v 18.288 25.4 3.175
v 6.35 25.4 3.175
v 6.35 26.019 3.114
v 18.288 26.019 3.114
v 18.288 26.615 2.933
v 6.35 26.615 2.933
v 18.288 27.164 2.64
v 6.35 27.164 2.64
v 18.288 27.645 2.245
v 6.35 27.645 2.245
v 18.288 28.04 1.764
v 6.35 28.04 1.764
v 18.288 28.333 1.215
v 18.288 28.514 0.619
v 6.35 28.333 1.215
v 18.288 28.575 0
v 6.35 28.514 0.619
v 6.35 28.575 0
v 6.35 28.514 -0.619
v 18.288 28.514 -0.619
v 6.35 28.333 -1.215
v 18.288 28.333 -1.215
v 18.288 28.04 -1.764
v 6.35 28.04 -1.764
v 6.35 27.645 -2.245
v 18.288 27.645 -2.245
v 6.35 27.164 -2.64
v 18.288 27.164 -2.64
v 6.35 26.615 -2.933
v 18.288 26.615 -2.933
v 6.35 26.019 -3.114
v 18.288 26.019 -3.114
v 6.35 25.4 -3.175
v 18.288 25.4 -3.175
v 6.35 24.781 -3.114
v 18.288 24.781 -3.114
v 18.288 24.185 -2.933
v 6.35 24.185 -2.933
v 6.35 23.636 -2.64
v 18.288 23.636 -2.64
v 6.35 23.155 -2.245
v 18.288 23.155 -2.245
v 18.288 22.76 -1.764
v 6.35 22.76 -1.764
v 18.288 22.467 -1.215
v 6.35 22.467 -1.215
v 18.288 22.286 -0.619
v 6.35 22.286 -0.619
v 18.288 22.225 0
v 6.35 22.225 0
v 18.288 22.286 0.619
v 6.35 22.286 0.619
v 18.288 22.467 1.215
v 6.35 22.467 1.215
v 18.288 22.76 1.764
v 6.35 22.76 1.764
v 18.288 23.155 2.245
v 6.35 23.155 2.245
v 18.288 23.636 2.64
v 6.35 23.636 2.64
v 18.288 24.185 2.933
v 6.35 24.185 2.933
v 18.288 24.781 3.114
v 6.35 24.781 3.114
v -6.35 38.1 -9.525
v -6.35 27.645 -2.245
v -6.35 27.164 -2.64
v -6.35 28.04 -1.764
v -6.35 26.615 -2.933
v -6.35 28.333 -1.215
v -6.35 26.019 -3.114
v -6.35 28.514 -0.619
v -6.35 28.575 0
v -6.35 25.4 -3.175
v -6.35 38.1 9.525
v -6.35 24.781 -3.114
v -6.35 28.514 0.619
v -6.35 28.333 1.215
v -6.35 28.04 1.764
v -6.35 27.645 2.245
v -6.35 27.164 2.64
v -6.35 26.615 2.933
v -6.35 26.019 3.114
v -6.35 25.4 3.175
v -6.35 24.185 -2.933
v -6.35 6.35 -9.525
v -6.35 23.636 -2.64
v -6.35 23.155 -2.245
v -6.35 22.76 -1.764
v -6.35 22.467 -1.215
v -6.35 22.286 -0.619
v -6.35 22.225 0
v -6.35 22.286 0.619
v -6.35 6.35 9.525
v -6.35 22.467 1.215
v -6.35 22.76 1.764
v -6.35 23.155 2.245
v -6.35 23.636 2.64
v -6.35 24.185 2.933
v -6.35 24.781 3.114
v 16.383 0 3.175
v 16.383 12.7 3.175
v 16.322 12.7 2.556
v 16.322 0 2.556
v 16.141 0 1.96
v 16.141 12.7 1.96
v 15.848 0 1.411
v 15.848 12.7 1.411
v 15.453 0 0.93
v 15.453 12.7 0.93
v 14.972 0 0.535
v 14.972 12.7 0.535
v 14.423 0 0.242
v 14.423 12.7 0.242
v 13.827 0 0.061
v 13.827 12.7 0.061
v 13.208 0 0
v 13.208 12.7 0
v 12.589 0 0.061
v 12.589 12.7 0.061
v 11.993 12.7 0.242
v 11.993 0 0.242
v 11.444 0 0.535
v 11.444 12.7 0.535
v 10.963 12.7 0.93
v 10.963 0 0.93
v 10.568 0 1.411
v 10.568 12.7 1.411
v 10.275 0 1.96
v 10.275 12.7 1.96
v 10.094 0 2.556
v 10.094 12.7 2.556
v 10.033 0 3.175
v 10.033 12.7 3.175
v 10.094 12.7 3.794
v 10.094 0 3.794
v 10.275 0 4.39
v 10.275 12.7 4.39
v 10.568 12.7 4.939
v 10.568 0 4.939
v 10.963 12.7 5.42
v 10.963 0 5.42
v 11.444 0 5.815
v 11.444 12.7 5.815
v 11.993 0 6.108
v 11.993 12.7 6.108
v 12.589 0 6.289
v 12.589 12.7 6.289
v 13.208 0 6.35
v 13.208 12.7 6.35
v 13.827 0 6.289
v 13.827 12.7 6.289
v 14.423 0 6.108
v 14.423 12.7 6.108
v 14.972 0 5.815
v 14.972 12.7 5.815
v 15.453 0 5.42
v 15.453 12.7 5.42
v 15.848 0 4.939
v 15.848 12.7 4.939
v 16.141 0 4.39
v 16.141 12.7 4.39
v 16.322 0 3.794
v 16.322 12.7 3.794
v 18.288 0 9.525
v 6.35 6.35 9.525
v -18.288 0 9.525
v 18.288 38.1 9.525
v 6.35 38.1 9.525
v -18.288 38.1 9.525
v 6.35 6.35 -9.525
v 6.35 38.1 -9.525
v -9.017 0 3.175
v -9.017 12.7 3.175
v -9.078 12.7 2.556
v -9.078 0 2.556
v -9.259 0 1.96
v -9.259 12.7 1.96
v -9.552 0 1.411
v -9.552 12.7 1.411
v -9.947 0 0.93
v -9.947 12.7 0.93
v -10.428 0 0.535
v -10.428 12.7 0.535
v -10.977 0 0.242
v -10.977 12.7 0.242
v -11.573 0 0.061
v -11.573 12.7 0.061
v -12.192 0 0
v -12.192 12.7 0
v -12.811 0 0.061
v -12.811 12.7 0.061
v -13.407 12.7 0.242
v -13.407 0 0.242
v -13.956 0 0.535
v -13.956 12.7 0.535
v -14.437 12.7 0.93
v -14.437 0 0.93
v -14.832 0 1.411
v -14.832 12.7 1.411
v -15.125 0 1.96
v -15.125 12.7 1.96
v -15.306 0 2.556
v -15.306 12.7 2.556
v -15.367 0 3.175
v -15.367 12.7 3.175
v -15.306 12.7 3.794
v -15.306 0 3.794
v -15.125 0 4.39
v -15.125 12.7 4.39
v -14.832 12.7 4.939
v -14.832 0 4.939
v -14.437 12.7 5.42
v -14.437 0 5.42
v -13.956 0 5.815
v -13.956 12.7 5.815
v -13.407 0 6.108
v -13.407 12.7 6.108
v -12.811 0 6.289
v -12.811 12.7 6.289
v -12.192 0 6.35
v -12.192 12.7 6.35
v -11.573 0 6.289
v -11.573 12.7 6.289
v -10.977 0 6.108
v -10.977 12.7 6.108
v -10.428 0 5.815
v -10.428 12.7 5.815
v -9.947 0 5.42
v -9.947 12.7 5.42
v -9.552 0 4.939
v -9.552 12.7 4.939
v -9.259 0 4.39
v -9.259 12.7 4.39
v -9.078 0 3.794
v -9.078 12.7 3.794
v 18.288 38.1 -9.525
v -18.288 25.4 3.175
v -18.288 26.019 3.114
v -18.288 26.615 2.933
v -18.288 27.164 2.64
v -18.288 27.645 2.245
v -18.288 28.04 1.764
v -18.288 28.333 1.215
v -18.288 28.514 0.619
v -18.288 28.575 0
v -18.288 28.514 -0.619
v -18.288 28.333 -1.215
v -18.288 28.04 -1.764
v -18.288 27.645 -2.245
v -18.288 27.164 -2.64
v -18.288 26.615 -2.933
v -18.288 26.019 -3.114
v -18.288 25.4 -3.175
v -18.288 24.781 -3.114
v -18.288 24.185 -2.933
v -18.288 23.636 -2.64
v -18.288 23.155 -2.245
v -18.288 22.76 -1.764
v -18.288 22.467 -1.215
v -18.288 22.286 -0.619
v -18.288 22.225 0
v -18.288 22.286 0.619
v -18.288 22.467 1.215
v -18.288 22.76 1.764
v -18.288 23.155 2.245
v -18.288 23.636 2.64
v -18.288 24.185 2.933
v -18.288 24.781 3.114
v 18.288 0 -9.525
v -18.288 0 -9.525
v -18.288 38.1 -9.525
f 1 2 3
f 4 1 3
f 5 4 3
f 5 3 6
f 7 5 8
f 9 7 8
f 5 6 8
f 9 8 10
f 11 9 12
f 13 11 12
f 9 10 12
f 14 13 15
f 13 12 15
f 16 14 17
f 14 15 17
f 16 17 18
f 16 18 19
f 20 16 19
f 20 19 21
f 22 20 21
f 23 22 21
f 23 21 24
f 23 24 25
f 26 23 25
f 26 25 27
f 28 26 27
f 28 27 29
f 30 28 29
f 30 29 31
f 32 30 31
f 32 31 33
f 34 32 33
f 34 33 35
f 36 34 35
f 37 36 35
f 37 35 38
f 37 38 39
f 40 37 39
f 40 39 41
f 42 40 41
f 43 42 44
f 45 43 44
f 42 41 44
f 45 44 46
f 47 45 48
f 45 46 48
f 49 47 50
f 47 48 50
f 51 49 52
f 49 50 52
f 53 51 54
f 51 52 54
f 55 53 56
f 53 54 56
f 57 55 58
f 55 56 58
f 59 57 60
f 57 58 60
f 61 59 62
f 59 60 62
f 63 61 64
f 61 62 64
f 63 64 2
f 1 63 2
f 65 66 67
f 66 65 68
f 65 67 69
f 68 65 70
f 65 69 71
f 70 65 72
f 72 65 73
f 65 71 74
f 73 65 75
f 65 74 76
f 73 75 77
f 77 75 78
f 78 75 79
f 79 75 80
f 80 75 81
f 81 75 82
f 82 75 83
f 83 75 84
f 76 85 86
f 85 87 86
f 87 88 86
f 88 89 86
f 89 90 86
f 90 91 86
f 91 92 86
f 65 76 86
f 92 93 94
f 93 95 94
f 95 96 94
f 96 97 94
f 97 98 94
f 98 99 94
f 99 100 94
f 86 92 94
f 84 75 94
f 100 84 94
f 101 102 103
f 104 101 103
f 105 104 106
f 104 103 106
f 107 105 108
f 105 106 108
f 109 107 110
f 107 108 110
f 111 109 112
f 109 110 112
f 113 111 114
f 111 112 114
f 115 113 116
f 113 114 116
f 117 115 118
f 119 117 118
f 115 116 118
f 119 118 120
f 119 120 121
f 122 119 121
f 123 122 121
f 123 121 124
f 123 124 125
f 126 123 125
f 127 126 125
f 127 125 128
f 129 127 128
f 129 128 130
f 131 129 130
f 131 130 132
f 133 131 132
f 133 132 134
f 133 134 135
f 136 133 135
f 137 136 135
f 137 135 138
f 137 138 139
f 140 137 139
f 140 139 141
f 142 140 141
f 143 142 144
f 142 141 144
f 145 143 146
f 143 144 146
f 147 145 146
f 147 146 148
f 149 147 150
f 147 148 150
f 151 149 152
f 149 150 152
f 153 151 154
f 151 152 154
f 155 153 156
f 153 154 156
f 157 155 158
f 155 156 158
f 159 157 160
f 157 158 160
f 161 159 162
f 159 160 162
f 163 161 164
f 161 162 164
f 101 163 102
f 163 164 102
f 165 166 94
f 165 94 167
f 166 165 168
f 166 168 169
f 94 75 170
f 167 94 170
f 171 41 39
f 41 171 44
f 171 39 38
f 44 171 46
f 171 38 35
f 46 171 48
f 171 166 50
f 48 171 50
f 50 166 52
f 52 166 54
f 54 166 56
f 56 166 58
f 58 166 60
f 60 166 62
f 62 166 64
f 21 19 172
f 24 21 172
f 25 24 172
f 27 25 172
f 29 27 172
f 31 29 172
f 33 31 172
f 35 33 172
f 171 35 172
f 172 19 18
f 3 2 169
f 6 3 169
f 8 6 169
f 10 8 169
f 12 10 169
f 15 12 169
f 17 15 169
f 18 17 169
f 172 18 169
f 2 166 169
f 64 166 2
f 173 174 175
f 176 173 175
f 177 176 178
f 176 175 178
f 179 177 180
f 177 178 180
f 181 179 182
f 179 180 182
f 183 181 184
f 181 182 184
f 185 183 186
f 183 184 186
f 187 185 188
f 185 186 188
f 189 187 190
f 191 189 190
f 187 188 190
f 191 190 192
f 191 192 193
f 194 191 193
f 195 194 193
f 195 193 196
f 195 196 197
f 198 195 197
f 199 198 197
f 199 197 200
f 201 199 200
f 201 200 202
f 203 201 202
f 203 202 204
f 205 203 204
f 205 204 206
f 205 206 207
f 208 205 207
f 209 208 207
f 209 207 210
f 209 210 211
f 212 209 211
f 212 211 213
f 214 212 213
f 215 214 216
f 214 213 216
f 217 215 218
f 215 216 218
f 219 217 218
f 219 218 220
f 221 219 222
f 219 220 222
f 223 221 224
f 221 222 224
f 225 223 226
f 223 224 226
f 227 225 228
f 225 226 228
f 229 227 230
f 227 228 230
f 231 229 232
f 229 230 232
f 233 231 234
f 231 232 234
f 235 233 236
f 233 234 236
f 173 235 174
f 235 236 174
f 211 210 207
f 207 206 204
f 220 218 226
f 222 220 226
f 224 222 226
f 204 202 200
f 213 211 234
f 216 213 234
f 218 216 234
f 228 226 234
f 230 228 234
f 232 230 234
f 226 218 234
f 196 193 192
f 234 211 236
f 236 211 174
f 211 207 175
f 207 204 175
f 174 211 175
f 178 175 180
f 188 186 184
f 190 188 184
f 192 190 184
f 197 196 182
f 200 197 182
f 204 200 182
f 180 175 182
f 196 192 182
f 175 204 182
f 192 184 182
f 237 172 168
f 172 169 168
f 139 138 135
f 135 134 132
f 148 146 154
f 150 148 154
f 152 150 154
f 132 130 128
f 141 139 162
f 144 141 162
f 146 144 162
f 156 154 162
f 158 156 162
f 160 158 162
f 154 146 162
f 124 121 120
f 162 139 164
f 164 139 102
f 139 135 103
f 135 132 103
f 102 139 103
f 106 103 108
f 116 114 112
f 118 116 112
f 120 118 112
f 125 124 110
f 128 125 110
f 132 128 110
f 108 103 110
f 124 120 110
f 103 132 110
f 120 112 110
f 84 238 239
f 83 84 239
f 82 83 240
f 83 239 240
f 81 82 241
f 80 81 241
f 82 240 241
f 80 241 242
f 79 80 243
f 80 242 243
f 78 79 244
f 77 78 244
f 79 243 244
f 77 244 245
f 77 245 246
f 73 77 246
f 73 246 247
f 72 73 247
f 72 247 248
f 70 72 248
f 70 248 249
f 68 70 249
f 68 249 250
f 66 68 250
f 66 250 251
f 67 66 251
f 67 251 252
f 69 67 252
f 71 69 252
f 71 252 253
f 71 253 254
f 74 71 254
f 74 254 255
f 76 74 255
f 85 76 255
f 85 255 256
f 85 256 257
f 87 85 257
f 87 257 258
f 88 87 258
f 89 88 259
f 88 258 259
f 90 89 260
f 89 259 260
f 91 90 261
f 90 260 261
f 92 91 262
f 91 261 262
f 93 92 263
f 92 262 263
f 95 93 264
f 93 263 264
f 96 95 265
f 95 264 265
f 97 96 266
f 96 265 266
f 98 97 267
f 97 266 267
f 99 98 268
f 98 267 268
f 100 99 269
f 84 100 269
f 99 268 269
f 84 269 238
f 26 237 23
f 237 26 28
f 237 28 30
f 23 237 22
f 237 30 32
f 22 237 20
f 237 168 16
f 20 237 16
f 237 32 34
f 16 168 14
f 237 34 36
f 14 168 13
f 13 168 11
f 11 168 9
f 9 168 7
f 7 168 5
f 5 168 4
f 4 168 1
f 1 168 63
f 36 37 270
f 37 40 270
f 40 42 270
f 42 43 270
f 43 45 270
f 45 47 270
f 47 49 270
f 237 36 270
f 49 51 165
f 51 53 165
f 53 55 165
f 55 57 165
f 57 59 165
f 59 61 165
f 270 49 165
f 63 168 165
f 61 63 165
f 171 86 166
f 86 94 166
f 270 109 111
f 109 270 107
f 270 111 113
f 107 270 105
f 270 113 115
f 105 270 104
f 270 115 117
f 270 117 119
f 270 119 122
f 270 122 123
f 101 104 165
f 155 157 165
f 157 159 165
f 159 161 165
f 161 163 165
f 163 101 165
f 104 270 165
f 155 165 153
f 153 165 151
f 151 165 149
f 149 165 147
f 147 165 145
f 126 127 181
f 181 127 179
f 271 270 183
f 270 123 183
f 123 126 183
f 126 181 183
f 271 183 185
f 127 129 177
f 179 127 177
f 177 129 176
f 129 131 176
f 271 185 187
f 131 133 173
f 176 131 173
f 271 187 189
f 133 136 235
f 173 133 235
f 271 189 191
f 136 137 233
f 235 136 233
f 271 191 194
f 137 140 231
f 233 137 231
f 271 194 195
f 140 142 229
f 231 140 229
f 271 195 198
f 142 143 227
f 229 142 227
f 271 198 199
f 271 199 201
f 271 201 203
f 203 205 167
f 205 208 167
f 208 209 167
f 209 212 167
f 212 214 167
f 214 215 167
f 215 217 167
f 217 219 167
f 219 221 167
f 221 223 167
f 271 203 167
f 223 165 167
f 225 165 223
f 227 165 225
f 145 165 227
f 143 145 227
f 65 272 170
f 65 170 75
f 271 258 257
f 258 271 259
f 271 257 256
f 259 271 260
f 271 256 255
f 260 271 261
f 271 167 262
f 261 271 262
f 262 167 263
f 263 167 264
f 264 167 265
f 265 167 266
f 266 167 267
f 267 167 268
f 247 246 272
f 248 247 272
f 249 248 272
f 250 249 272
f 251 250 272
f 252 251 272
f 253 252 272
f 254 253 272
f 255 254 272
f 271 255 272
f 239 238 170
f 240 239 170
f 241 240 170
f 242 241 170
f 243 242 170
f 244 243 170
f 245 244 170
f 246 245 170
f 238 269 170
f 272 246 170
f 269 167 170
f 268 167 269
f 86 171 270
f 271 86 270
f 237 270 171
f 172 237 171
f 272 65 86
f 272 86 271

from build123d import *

# Parameters (mm, degrees)
BOSS_EXTRUDE1_DEPTH = 9.525
HOLE1_D             = 6.35
HOLE2_D             = 6.35
HOLE2_DEPTH         = 12.7


with BuildPart() as part:
    # Sketch1 → Boss-Extrude1 (new, symmetric)
    with BuildSketch(Plane.XY):
        Polygon((-18.288, 0), (-18.288, 38.1), (-6.35, 38.1), (-6.35, 6.35), (6.35, 6.35), (6.35, 38.1), (18.288, 38.1), (18.288, 0), align=None)
    extrude(amount=BOSS_EXTRUDE1_DEPTH, both=True)

    # Hole1 (through all)
    with Locations(Plane(origin=(18.288, 0, 0), x_dir=(0, 0, -1), z_dir=(1, 0, 0))):
        with Locations((0, 25.4)):
            Hole(HOLE1_D / 2)

    # Hole2
    with Locations(Plane(origin=(0, 0, 0), x_dir=(-1, 0, 0), z_dir=(0, -1, 0))):
        with Locations((-13.208, -3.175), (12.192, -3.175)):
            Hole(HOLE2_D / 2, depth=HOLE2_DEPTH)


solid = part.part
